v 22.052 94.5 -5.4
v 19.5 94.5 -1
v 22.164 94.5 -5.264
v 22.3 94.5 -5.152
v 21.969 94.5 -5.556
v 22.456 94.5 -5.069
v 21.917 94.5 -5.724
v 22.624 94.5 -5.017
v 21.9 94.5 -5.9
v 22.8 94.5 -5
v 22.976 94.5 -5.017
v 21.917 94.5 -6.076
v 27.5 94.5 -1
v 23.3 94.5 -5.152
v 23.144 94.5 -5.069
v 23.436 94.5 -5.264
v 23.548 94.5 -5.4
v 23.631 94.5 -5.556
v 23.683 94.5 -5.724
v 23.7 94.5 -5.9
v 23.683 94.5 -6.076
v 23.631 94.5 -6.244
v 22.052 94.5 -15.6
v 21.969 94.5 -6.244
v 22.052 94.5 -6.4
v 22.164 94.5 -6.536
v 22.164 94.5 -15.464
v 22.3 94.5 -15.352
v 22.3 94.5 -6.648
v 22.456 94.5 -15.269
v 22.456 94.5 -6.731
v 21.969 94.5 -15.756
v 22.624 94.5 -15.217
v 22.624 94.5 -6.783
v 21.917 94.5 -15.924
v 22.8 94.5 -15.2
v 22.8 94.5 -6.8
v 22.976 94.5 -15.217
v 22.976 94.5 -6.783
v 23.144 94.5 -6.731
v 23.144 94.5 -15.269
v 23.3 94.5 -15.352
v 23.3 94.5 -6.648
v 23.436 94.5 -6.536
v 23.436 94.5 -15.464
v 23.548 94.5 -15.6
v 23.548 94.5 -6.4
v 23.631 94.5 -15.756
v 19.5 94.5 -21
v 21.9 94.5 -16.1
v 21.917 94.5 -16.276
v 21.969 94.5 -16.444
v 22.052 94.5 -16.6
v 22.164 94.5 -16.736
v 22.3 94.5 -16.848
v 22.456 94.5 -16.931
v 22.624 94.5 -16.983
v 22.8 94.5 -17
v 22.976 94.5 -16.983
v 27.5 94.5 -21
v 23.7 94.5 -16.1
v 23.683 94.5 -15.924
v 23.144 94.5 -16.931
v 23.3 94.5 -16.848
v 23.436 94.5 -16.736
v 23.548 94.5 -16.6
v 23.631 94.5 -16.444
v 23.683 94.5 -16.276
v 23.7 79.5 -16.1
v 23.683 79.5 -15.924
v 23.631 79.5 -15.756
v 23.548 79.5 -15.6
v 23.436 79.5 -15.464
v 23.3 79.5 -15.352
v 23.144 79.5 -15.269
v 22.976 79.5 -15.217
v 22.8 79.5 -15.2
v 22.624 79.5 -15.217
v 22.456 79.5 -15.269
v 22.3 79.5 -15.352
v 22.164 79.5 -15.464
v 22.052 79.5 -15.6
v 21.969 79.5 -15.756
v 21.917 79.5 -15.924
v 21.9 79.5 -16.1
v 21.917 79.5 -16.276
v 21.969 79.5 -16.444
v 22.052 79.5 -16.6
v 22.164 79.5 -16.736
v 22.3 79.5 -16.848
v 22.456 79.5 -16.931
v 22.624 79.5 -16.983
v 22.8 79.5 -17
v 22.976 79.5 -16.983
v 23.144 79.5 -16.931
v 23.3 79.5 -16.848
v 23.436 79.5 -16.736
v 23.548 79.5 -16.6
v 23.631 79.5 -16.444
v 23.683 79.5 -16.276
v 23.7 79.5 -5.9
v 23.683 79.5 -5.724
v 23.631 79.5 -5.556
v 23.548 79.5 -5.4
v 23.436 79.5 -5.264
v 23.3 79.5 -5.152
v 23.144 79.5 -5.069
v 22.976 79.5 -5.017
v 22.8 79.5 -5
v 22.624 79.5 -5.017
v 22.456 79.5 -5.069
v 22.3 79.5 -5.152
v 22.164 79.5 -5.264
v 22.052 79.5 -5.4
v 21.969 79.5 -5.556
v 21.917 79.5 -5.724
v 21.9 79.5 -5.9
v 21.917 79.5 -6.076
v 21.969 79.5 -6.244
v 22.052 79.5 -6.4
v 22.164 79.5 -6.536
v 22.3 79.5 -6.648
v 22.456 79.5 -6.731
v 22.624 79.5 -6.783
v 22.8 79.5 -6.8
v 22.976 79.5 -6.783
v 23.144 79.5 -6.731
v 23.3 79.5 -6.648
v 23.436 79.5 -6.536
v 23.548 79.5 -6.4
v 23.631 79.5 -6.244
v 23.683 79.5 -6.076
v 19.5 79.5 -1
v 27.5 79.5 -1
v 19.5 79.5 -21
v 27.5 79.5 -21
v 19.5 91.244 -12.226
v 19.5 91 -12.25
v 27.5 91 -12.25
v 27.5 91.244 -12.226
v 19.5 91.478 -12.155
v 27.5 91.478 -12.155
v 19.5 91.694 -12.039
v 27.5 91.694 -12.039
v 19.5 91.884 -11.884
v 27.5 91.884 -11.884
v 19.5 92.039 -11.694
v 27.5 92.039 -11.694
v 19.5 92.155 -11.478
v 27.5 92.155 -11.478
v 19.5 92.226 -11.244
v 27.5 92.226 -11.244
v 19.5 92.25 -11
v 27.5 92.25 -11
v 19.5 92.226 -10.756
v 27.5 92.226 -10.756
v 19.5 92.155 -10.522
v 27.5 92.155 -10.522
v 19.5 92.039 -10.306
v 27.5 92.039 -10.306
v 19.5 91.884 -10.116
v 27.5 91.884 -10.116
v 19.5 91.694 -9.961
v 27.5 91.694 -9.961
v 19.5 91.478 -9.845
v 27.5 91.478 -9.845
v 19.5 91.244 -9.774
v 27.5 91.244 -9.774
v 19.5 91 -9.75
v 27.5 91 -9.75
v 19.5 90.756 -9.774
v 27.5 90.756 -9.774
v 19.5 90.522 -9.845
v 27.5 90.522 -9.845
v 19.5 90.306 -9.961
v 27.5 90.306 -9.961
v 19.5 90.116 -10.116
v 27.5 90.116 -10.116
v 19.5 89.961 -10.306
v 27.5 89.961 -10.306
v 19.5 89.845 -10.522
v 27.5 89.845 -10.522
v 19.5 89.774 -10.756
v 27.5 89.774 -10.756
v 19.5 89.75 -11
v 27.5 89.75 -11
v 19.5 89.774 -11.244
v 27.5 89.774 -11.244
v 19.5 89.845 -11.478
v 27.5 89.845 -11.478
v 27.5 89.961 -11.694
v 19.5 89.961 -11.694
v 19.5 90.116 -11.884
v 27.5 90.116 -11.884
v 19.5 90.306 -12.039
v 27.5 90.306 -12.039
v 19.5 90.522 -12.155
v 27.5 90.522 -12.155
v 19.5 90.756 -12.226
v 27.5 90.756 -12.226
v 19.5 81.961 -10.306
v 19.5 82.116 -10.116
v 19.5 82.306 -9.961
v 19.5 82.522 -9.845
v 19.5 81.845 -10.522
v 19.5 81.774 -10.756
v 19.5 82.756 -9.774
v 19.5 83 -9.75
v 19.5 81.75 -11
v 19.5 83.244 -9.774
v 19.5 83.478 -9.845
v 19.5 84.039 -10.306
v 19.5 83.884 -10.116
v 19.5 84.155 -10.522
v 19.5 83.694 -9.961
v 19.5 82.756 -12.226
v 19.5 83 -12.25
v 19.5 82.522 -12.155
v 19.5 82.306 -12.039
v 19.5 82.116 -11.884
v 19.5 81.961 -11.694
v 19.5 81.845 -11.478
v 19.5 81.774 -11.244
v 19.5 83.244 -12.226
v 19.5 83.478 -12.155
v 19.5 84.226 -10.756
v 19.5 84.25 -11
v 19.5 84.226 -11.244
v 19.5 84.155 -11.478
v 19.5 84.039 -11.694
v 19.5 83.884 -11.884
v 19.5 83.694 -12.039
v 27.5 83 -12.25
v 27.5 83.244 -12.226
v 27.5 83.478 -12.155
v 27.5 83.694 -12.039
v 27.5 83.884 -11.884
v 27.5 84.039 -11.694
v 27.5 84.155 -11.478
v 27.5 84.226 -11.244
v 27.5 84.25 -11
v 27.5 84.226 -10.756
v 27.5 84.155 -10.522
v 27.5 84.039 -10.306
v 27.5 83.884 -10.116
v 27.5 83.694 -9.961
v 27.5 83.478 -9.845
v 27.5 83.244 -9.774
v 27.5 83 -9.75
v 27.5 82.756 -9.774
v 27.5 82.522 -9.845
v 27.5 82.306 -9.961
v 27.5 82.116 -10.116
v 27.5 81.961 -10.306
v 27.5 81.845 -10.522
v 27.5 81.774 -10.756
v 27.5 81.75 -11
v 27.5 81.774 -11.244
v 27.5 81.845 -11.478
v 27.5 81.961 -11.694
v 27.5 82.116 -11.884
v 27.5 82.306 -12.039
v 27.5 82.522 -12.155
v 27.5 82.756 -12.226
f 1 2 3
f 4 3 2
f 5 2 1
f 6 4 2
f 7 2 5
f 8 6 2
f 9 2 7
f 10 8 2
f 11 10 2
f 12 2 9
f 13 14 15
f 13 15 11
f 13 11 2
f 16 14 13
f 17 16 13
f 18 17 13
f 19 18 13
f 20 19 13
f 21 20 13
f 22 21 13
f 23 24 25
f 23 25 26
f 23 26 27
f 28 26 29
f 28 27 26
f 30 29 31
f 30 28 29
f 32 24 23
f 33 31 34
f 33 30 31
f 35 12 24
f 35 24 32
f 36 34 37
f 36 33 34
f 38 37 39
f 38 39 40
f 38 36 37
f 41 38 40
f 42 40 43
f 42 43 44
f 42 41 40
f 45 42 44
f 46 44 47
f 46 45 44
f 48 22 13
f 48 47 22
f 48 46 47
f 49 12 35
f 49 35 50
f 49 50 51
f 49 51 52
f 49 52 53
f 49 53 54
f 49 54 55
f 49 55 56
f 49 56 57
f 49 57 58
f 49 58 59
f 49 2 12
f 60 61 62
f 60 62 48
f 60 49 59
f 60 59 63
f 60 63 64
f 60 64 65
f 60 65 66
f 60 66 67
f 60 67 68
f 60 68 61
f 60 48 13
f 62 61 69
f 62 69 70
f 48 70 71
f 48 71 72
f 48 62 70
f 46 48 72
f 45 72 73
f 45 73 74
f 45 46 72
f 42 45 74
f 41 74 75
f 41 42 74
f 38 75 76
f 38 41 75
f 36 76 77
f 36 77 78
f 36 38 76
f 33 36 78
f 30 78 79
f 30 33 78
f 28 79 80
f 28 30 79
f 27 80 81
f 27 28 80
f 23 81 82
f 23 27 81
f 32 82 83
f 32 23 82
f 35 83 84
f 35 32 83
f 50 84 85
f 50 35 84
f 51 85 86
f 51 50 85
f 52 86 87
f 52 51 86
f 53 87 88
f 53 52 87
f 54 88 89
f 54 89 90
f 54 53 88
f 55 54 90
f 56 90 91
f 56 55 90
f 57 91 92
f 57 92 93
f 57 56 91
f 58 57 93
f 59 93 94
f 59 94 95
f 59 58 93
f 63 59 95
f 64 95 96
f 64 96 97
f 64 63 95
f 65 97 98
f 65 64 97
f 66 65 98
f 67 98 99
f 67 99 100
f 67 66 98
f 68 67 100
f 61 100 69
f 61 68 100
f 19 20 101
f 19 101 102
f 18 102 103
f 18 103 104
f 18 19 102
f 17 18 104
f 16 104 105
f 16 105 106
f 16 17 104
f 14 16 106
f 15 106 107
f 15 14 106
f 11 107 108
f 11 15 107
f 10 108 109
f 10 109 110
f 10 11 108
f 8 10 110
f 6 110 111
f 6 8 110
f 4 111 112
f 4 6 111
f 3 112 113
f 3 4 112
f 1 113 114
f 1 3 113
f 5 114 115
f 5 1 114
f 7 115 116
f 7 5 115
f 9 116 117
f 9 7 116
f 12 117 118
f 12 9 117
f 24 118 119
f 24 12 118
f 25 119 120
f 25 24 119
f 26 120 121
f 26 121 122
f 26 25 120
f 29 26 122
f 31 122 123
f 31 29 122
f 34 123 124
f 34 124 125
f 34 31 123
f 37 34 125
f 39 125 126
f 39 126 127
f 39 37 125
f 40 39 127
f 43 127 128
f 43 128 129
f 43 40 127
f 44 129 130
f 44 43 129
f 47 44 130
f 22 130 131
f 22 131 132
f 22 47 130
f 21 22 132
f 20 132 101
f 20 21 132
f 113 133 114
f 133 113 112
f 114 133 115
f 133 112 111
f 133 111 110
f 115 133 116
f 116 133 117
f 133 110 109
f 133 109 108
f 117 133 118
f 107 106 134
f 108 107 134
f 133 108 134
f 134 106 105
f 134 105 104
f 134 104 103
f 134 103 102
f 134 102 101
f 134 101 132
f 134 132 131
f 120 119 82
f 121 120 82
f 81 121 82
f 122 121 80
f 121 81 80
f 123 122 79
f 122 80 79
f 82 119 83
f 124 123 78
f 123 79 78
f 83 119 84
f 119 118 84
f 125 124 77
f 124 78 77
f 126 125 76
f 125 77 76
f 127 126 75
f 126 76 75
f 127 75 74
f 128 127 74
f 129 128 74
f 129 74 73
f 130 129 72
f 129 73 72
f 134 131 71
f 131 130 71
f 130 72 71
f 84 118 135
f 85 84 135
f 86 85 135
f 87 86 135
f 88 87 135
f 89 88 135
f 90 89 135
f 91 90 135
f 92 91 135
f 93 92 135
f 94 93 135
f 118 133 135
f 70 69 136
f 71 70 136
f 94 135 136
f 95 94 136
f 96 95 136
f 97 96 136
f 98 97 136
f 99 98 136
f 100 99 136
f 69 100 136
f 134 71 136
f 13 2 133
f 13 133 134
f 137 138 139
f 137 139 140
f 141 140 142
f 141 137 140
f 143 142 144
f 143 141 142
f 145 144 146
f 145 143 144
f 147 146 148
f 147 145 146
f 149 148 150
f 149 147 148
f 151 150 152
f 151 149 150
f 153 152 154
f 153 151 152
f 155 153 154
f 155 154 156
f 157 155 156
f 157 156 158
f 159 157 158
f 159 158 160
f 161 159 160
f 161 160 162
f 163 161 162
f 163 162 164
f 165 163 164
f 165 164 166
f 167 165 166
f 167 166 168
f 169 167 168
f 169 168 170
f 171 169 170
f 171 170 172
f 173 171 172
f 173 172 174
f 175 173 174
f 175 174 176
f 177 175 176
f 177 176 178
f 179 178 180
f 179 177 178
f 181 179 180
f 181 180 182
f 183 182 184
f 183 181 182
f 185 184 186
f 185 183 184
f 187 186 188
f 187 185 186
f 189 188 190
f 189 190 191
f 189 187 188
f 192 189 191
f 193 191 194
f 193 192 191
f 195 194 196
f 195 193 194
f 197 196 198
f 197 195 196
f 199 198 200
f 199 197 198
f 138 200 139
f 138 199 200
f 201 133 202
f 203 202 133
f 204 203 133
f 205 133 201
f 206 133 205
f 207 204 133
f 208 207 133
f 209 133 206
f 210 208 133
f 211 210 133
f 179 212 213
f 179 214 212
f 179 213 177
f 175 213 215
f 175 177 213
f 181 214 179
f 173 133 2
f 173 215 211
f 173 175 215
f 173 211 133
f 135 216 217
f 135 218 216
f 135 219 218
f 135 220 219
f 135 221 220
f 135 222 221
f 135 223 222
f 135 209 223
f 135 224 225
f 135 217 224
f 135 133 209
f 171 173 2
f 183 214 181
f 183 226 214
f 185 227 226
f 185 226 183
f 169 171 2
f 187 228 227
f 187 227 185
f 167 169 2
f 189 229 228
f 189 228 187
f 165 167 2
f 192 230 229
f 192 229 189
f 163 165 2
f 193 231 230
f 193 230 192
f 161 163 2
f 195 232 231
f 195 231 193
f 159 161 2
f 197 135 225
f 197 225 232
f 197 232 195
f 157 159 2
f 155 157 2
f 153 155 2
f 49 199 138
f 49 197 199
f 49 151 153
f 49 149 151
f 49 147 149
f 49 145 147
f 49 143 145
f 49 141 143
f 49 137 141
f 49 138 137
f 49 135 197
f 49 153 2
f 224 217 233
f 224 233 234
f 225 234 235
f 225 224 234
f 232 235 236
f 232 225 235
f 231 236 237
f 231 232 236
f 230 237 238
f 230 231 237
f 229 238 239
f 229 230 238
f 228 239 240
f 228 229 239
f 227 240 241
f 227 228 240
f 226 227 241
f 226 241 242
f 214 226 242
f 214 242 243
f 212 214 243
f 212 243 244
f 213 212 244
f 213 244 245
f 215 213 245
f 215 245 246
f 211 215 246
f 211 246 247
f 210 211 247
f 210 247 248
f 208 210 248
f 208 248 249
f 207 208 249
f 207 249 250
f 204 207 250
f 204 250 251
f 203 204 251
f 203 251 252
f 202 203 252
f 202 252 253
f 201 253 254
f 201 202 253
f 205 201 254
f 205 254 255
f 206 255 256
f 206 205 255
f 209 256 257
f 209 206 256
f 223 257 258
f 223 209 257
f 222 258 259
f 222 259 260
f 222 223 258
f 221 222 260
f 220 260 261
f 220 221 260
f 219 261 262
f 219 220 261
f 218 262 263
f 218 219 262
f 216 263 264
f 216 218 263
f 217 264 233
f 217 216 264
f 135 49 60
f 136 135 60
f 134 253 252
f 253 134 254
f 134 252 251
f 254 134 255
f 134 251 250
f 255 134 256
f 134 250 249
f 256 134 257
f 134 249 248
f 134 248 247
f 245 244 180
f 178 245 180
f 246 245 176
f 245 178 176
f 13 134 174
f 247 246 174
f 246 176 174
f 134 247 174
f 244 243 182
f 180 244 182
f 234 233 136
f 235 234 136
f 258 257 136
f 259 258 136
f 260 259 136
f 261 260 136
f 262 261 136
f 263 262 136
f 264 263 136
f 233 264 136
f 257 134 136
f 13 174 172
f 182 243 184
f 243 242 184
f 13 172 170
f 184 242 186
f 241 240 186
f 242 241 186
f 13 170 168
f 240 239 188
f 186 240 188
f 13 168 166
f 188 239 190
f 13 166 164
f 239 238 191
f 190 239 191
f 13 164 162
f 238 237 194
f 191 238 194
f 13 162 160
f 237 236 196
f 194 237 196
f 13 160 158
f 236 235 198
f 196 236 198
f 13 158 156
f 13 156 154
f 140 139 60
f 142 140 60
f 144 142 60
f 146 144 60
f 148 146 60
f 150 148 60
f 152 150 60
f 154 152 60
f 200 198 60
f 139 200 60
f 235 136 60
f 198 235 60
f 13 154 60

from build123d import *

# Parameters (mm, degrees)
CYLINDER948_R           = 0.9
CYLINDER948_DEPTH       = 15
CYLINDER948_ROLL_ANGLE  = 90
CYLINDER949_R           = 0.9
CYLINDER949_DEPTH       = 15
CYLINDER949_ROLL_ANGLE  = 90
CYLINDER947_R           = 1.25
CYLINDER947_DEPTH       = 10
CYLINDER947_PITCH_ANGLE = 90
CYLINDER946_R           = 1.25
CYLINDER946_DEPTH       = 10
CYLINDER946_PITCH_ANGLE = 90
BOX556_W                = 8
BOX556_H                = 15
BOX556_DEPTH            = 20


with BuildPart() as cylinder1099:
    # Cylinder948 → Cylinder948 (new body)
    with BuildSketch(Plane.XY):
        Circle(CYLINDER948_R)
    extrude(amount=CYLINDER948_DEPTH)


with BuildPart() as cylinder1099_1:
    # Cylinder948 roll: moved
    add(cylinder1099.part.rotate(Axis((0, 0, 0), (1, 0, 0)), CYLINDER948_ROLL_ANGLE))


with BuildPart() as cylinder1099_2:
    # Cylinder948 placement: moved
    add(cylinder1099_1.part.moved(Location((27, 85, -10.2))))


with BuildPart() as fusion595:
    # Cylinder949 → Cylinder949 (new body)
    with BuildSketch(Plane.XY):
        Circle(CYLINDER949_R)
    extrude(amount=CYLINDER949_DEPTH)


with BuildPart() as fusion595_1:
    # Cylinder949 roll: moved
    add(fusion595.part.rotate(Axis((0, 0, 0), (1, 0, 0)), CYLINDER949_ROLL_ANGLE))


with BuildPart() as fusion595_2:
    # Cylinder949 placement: moved
    add(fusion595_1.part.moved(Location((27, 85, 0))))

    # Fusion595: union Cylinder1099
    add(cylinder1099_2.part)


with BuildPart() as fusion595_3:
    # Fusion595 placement: moved
    add(fusion595_2.part.moved(Location((-4.2, 9.5, -5.9))))


with BuildPart() as cylinder1094:
    # Cylinder947 → Cylinder947 (new body)
    with BuildSketch(Plane.XY):
        Circle(CYLINDER947_R)
    extrude(amount=CYLINDER947_DEPTH)


with BuildPart() as cylinder1094_1:
    # Cylinder947 pitch: moved
    add(cylinder1094.part.rotate(Axis((0, 0, 0), (0, 1, 0)), CYLINDER947_PITCH_ANGLE))


with BuildPart() as cylinder1094_2:
    # Cylinder947 placement: moved
    add(cylinder1094_1.part.moved(Location((13.5, 83, -11))))


with BuildPart() as fusion594:
    # Cylinder946 → Cylinder946 (new body)
    with BuildSketch(Plane.XY):
        Circle(CYLINDER946_R)
    extrude(amount=CYLINDER946_DEPTH)


with BuildPart() as fusion594_1:
    # Cylinder946 pitch: moved
    add(fusion594.part.rotate(Axis((0, 0, 0), (0, 1, 0)), CYLINDER946_PITCH_ANGLE))


with BuildPart() as fusion594_2:
    # Cylinder946 placement: moved
    add(fusion594_1.part.moved(Location((13.5, 91, -11))))

    # Fusion594: union Cylinder1094
    add(cylinder1094_2.part)


with BuildPart() as fusion594_3:
    # Fusion594 placement: moved
    add(fusion594_2.part.moved(Location((4, 0, 0))))


with BuildPart() as steering_servo_front_mount:
    # Box556 → Box556 (new body)
    with BuildSketch(Plane(origin=(19.5, 79.5, -21), x_dir=(1, 0, 0), z_dir=(0, 0, 1))):
        with Locations((4, 7.5)):
            Rectangle(BOX556_W, BOX556_H)
    extrude(amount=BOX556_DEPTH)

    # Cut693: cut Fusion594
    add(fusion594_3.part, mode=Mode.SUBTRACT)

    # Cut694: cut Fusion595
    add(fusion595_3.part, mode=Mode.SUBTRACT)


solid = steering_servo_front_mount.part
